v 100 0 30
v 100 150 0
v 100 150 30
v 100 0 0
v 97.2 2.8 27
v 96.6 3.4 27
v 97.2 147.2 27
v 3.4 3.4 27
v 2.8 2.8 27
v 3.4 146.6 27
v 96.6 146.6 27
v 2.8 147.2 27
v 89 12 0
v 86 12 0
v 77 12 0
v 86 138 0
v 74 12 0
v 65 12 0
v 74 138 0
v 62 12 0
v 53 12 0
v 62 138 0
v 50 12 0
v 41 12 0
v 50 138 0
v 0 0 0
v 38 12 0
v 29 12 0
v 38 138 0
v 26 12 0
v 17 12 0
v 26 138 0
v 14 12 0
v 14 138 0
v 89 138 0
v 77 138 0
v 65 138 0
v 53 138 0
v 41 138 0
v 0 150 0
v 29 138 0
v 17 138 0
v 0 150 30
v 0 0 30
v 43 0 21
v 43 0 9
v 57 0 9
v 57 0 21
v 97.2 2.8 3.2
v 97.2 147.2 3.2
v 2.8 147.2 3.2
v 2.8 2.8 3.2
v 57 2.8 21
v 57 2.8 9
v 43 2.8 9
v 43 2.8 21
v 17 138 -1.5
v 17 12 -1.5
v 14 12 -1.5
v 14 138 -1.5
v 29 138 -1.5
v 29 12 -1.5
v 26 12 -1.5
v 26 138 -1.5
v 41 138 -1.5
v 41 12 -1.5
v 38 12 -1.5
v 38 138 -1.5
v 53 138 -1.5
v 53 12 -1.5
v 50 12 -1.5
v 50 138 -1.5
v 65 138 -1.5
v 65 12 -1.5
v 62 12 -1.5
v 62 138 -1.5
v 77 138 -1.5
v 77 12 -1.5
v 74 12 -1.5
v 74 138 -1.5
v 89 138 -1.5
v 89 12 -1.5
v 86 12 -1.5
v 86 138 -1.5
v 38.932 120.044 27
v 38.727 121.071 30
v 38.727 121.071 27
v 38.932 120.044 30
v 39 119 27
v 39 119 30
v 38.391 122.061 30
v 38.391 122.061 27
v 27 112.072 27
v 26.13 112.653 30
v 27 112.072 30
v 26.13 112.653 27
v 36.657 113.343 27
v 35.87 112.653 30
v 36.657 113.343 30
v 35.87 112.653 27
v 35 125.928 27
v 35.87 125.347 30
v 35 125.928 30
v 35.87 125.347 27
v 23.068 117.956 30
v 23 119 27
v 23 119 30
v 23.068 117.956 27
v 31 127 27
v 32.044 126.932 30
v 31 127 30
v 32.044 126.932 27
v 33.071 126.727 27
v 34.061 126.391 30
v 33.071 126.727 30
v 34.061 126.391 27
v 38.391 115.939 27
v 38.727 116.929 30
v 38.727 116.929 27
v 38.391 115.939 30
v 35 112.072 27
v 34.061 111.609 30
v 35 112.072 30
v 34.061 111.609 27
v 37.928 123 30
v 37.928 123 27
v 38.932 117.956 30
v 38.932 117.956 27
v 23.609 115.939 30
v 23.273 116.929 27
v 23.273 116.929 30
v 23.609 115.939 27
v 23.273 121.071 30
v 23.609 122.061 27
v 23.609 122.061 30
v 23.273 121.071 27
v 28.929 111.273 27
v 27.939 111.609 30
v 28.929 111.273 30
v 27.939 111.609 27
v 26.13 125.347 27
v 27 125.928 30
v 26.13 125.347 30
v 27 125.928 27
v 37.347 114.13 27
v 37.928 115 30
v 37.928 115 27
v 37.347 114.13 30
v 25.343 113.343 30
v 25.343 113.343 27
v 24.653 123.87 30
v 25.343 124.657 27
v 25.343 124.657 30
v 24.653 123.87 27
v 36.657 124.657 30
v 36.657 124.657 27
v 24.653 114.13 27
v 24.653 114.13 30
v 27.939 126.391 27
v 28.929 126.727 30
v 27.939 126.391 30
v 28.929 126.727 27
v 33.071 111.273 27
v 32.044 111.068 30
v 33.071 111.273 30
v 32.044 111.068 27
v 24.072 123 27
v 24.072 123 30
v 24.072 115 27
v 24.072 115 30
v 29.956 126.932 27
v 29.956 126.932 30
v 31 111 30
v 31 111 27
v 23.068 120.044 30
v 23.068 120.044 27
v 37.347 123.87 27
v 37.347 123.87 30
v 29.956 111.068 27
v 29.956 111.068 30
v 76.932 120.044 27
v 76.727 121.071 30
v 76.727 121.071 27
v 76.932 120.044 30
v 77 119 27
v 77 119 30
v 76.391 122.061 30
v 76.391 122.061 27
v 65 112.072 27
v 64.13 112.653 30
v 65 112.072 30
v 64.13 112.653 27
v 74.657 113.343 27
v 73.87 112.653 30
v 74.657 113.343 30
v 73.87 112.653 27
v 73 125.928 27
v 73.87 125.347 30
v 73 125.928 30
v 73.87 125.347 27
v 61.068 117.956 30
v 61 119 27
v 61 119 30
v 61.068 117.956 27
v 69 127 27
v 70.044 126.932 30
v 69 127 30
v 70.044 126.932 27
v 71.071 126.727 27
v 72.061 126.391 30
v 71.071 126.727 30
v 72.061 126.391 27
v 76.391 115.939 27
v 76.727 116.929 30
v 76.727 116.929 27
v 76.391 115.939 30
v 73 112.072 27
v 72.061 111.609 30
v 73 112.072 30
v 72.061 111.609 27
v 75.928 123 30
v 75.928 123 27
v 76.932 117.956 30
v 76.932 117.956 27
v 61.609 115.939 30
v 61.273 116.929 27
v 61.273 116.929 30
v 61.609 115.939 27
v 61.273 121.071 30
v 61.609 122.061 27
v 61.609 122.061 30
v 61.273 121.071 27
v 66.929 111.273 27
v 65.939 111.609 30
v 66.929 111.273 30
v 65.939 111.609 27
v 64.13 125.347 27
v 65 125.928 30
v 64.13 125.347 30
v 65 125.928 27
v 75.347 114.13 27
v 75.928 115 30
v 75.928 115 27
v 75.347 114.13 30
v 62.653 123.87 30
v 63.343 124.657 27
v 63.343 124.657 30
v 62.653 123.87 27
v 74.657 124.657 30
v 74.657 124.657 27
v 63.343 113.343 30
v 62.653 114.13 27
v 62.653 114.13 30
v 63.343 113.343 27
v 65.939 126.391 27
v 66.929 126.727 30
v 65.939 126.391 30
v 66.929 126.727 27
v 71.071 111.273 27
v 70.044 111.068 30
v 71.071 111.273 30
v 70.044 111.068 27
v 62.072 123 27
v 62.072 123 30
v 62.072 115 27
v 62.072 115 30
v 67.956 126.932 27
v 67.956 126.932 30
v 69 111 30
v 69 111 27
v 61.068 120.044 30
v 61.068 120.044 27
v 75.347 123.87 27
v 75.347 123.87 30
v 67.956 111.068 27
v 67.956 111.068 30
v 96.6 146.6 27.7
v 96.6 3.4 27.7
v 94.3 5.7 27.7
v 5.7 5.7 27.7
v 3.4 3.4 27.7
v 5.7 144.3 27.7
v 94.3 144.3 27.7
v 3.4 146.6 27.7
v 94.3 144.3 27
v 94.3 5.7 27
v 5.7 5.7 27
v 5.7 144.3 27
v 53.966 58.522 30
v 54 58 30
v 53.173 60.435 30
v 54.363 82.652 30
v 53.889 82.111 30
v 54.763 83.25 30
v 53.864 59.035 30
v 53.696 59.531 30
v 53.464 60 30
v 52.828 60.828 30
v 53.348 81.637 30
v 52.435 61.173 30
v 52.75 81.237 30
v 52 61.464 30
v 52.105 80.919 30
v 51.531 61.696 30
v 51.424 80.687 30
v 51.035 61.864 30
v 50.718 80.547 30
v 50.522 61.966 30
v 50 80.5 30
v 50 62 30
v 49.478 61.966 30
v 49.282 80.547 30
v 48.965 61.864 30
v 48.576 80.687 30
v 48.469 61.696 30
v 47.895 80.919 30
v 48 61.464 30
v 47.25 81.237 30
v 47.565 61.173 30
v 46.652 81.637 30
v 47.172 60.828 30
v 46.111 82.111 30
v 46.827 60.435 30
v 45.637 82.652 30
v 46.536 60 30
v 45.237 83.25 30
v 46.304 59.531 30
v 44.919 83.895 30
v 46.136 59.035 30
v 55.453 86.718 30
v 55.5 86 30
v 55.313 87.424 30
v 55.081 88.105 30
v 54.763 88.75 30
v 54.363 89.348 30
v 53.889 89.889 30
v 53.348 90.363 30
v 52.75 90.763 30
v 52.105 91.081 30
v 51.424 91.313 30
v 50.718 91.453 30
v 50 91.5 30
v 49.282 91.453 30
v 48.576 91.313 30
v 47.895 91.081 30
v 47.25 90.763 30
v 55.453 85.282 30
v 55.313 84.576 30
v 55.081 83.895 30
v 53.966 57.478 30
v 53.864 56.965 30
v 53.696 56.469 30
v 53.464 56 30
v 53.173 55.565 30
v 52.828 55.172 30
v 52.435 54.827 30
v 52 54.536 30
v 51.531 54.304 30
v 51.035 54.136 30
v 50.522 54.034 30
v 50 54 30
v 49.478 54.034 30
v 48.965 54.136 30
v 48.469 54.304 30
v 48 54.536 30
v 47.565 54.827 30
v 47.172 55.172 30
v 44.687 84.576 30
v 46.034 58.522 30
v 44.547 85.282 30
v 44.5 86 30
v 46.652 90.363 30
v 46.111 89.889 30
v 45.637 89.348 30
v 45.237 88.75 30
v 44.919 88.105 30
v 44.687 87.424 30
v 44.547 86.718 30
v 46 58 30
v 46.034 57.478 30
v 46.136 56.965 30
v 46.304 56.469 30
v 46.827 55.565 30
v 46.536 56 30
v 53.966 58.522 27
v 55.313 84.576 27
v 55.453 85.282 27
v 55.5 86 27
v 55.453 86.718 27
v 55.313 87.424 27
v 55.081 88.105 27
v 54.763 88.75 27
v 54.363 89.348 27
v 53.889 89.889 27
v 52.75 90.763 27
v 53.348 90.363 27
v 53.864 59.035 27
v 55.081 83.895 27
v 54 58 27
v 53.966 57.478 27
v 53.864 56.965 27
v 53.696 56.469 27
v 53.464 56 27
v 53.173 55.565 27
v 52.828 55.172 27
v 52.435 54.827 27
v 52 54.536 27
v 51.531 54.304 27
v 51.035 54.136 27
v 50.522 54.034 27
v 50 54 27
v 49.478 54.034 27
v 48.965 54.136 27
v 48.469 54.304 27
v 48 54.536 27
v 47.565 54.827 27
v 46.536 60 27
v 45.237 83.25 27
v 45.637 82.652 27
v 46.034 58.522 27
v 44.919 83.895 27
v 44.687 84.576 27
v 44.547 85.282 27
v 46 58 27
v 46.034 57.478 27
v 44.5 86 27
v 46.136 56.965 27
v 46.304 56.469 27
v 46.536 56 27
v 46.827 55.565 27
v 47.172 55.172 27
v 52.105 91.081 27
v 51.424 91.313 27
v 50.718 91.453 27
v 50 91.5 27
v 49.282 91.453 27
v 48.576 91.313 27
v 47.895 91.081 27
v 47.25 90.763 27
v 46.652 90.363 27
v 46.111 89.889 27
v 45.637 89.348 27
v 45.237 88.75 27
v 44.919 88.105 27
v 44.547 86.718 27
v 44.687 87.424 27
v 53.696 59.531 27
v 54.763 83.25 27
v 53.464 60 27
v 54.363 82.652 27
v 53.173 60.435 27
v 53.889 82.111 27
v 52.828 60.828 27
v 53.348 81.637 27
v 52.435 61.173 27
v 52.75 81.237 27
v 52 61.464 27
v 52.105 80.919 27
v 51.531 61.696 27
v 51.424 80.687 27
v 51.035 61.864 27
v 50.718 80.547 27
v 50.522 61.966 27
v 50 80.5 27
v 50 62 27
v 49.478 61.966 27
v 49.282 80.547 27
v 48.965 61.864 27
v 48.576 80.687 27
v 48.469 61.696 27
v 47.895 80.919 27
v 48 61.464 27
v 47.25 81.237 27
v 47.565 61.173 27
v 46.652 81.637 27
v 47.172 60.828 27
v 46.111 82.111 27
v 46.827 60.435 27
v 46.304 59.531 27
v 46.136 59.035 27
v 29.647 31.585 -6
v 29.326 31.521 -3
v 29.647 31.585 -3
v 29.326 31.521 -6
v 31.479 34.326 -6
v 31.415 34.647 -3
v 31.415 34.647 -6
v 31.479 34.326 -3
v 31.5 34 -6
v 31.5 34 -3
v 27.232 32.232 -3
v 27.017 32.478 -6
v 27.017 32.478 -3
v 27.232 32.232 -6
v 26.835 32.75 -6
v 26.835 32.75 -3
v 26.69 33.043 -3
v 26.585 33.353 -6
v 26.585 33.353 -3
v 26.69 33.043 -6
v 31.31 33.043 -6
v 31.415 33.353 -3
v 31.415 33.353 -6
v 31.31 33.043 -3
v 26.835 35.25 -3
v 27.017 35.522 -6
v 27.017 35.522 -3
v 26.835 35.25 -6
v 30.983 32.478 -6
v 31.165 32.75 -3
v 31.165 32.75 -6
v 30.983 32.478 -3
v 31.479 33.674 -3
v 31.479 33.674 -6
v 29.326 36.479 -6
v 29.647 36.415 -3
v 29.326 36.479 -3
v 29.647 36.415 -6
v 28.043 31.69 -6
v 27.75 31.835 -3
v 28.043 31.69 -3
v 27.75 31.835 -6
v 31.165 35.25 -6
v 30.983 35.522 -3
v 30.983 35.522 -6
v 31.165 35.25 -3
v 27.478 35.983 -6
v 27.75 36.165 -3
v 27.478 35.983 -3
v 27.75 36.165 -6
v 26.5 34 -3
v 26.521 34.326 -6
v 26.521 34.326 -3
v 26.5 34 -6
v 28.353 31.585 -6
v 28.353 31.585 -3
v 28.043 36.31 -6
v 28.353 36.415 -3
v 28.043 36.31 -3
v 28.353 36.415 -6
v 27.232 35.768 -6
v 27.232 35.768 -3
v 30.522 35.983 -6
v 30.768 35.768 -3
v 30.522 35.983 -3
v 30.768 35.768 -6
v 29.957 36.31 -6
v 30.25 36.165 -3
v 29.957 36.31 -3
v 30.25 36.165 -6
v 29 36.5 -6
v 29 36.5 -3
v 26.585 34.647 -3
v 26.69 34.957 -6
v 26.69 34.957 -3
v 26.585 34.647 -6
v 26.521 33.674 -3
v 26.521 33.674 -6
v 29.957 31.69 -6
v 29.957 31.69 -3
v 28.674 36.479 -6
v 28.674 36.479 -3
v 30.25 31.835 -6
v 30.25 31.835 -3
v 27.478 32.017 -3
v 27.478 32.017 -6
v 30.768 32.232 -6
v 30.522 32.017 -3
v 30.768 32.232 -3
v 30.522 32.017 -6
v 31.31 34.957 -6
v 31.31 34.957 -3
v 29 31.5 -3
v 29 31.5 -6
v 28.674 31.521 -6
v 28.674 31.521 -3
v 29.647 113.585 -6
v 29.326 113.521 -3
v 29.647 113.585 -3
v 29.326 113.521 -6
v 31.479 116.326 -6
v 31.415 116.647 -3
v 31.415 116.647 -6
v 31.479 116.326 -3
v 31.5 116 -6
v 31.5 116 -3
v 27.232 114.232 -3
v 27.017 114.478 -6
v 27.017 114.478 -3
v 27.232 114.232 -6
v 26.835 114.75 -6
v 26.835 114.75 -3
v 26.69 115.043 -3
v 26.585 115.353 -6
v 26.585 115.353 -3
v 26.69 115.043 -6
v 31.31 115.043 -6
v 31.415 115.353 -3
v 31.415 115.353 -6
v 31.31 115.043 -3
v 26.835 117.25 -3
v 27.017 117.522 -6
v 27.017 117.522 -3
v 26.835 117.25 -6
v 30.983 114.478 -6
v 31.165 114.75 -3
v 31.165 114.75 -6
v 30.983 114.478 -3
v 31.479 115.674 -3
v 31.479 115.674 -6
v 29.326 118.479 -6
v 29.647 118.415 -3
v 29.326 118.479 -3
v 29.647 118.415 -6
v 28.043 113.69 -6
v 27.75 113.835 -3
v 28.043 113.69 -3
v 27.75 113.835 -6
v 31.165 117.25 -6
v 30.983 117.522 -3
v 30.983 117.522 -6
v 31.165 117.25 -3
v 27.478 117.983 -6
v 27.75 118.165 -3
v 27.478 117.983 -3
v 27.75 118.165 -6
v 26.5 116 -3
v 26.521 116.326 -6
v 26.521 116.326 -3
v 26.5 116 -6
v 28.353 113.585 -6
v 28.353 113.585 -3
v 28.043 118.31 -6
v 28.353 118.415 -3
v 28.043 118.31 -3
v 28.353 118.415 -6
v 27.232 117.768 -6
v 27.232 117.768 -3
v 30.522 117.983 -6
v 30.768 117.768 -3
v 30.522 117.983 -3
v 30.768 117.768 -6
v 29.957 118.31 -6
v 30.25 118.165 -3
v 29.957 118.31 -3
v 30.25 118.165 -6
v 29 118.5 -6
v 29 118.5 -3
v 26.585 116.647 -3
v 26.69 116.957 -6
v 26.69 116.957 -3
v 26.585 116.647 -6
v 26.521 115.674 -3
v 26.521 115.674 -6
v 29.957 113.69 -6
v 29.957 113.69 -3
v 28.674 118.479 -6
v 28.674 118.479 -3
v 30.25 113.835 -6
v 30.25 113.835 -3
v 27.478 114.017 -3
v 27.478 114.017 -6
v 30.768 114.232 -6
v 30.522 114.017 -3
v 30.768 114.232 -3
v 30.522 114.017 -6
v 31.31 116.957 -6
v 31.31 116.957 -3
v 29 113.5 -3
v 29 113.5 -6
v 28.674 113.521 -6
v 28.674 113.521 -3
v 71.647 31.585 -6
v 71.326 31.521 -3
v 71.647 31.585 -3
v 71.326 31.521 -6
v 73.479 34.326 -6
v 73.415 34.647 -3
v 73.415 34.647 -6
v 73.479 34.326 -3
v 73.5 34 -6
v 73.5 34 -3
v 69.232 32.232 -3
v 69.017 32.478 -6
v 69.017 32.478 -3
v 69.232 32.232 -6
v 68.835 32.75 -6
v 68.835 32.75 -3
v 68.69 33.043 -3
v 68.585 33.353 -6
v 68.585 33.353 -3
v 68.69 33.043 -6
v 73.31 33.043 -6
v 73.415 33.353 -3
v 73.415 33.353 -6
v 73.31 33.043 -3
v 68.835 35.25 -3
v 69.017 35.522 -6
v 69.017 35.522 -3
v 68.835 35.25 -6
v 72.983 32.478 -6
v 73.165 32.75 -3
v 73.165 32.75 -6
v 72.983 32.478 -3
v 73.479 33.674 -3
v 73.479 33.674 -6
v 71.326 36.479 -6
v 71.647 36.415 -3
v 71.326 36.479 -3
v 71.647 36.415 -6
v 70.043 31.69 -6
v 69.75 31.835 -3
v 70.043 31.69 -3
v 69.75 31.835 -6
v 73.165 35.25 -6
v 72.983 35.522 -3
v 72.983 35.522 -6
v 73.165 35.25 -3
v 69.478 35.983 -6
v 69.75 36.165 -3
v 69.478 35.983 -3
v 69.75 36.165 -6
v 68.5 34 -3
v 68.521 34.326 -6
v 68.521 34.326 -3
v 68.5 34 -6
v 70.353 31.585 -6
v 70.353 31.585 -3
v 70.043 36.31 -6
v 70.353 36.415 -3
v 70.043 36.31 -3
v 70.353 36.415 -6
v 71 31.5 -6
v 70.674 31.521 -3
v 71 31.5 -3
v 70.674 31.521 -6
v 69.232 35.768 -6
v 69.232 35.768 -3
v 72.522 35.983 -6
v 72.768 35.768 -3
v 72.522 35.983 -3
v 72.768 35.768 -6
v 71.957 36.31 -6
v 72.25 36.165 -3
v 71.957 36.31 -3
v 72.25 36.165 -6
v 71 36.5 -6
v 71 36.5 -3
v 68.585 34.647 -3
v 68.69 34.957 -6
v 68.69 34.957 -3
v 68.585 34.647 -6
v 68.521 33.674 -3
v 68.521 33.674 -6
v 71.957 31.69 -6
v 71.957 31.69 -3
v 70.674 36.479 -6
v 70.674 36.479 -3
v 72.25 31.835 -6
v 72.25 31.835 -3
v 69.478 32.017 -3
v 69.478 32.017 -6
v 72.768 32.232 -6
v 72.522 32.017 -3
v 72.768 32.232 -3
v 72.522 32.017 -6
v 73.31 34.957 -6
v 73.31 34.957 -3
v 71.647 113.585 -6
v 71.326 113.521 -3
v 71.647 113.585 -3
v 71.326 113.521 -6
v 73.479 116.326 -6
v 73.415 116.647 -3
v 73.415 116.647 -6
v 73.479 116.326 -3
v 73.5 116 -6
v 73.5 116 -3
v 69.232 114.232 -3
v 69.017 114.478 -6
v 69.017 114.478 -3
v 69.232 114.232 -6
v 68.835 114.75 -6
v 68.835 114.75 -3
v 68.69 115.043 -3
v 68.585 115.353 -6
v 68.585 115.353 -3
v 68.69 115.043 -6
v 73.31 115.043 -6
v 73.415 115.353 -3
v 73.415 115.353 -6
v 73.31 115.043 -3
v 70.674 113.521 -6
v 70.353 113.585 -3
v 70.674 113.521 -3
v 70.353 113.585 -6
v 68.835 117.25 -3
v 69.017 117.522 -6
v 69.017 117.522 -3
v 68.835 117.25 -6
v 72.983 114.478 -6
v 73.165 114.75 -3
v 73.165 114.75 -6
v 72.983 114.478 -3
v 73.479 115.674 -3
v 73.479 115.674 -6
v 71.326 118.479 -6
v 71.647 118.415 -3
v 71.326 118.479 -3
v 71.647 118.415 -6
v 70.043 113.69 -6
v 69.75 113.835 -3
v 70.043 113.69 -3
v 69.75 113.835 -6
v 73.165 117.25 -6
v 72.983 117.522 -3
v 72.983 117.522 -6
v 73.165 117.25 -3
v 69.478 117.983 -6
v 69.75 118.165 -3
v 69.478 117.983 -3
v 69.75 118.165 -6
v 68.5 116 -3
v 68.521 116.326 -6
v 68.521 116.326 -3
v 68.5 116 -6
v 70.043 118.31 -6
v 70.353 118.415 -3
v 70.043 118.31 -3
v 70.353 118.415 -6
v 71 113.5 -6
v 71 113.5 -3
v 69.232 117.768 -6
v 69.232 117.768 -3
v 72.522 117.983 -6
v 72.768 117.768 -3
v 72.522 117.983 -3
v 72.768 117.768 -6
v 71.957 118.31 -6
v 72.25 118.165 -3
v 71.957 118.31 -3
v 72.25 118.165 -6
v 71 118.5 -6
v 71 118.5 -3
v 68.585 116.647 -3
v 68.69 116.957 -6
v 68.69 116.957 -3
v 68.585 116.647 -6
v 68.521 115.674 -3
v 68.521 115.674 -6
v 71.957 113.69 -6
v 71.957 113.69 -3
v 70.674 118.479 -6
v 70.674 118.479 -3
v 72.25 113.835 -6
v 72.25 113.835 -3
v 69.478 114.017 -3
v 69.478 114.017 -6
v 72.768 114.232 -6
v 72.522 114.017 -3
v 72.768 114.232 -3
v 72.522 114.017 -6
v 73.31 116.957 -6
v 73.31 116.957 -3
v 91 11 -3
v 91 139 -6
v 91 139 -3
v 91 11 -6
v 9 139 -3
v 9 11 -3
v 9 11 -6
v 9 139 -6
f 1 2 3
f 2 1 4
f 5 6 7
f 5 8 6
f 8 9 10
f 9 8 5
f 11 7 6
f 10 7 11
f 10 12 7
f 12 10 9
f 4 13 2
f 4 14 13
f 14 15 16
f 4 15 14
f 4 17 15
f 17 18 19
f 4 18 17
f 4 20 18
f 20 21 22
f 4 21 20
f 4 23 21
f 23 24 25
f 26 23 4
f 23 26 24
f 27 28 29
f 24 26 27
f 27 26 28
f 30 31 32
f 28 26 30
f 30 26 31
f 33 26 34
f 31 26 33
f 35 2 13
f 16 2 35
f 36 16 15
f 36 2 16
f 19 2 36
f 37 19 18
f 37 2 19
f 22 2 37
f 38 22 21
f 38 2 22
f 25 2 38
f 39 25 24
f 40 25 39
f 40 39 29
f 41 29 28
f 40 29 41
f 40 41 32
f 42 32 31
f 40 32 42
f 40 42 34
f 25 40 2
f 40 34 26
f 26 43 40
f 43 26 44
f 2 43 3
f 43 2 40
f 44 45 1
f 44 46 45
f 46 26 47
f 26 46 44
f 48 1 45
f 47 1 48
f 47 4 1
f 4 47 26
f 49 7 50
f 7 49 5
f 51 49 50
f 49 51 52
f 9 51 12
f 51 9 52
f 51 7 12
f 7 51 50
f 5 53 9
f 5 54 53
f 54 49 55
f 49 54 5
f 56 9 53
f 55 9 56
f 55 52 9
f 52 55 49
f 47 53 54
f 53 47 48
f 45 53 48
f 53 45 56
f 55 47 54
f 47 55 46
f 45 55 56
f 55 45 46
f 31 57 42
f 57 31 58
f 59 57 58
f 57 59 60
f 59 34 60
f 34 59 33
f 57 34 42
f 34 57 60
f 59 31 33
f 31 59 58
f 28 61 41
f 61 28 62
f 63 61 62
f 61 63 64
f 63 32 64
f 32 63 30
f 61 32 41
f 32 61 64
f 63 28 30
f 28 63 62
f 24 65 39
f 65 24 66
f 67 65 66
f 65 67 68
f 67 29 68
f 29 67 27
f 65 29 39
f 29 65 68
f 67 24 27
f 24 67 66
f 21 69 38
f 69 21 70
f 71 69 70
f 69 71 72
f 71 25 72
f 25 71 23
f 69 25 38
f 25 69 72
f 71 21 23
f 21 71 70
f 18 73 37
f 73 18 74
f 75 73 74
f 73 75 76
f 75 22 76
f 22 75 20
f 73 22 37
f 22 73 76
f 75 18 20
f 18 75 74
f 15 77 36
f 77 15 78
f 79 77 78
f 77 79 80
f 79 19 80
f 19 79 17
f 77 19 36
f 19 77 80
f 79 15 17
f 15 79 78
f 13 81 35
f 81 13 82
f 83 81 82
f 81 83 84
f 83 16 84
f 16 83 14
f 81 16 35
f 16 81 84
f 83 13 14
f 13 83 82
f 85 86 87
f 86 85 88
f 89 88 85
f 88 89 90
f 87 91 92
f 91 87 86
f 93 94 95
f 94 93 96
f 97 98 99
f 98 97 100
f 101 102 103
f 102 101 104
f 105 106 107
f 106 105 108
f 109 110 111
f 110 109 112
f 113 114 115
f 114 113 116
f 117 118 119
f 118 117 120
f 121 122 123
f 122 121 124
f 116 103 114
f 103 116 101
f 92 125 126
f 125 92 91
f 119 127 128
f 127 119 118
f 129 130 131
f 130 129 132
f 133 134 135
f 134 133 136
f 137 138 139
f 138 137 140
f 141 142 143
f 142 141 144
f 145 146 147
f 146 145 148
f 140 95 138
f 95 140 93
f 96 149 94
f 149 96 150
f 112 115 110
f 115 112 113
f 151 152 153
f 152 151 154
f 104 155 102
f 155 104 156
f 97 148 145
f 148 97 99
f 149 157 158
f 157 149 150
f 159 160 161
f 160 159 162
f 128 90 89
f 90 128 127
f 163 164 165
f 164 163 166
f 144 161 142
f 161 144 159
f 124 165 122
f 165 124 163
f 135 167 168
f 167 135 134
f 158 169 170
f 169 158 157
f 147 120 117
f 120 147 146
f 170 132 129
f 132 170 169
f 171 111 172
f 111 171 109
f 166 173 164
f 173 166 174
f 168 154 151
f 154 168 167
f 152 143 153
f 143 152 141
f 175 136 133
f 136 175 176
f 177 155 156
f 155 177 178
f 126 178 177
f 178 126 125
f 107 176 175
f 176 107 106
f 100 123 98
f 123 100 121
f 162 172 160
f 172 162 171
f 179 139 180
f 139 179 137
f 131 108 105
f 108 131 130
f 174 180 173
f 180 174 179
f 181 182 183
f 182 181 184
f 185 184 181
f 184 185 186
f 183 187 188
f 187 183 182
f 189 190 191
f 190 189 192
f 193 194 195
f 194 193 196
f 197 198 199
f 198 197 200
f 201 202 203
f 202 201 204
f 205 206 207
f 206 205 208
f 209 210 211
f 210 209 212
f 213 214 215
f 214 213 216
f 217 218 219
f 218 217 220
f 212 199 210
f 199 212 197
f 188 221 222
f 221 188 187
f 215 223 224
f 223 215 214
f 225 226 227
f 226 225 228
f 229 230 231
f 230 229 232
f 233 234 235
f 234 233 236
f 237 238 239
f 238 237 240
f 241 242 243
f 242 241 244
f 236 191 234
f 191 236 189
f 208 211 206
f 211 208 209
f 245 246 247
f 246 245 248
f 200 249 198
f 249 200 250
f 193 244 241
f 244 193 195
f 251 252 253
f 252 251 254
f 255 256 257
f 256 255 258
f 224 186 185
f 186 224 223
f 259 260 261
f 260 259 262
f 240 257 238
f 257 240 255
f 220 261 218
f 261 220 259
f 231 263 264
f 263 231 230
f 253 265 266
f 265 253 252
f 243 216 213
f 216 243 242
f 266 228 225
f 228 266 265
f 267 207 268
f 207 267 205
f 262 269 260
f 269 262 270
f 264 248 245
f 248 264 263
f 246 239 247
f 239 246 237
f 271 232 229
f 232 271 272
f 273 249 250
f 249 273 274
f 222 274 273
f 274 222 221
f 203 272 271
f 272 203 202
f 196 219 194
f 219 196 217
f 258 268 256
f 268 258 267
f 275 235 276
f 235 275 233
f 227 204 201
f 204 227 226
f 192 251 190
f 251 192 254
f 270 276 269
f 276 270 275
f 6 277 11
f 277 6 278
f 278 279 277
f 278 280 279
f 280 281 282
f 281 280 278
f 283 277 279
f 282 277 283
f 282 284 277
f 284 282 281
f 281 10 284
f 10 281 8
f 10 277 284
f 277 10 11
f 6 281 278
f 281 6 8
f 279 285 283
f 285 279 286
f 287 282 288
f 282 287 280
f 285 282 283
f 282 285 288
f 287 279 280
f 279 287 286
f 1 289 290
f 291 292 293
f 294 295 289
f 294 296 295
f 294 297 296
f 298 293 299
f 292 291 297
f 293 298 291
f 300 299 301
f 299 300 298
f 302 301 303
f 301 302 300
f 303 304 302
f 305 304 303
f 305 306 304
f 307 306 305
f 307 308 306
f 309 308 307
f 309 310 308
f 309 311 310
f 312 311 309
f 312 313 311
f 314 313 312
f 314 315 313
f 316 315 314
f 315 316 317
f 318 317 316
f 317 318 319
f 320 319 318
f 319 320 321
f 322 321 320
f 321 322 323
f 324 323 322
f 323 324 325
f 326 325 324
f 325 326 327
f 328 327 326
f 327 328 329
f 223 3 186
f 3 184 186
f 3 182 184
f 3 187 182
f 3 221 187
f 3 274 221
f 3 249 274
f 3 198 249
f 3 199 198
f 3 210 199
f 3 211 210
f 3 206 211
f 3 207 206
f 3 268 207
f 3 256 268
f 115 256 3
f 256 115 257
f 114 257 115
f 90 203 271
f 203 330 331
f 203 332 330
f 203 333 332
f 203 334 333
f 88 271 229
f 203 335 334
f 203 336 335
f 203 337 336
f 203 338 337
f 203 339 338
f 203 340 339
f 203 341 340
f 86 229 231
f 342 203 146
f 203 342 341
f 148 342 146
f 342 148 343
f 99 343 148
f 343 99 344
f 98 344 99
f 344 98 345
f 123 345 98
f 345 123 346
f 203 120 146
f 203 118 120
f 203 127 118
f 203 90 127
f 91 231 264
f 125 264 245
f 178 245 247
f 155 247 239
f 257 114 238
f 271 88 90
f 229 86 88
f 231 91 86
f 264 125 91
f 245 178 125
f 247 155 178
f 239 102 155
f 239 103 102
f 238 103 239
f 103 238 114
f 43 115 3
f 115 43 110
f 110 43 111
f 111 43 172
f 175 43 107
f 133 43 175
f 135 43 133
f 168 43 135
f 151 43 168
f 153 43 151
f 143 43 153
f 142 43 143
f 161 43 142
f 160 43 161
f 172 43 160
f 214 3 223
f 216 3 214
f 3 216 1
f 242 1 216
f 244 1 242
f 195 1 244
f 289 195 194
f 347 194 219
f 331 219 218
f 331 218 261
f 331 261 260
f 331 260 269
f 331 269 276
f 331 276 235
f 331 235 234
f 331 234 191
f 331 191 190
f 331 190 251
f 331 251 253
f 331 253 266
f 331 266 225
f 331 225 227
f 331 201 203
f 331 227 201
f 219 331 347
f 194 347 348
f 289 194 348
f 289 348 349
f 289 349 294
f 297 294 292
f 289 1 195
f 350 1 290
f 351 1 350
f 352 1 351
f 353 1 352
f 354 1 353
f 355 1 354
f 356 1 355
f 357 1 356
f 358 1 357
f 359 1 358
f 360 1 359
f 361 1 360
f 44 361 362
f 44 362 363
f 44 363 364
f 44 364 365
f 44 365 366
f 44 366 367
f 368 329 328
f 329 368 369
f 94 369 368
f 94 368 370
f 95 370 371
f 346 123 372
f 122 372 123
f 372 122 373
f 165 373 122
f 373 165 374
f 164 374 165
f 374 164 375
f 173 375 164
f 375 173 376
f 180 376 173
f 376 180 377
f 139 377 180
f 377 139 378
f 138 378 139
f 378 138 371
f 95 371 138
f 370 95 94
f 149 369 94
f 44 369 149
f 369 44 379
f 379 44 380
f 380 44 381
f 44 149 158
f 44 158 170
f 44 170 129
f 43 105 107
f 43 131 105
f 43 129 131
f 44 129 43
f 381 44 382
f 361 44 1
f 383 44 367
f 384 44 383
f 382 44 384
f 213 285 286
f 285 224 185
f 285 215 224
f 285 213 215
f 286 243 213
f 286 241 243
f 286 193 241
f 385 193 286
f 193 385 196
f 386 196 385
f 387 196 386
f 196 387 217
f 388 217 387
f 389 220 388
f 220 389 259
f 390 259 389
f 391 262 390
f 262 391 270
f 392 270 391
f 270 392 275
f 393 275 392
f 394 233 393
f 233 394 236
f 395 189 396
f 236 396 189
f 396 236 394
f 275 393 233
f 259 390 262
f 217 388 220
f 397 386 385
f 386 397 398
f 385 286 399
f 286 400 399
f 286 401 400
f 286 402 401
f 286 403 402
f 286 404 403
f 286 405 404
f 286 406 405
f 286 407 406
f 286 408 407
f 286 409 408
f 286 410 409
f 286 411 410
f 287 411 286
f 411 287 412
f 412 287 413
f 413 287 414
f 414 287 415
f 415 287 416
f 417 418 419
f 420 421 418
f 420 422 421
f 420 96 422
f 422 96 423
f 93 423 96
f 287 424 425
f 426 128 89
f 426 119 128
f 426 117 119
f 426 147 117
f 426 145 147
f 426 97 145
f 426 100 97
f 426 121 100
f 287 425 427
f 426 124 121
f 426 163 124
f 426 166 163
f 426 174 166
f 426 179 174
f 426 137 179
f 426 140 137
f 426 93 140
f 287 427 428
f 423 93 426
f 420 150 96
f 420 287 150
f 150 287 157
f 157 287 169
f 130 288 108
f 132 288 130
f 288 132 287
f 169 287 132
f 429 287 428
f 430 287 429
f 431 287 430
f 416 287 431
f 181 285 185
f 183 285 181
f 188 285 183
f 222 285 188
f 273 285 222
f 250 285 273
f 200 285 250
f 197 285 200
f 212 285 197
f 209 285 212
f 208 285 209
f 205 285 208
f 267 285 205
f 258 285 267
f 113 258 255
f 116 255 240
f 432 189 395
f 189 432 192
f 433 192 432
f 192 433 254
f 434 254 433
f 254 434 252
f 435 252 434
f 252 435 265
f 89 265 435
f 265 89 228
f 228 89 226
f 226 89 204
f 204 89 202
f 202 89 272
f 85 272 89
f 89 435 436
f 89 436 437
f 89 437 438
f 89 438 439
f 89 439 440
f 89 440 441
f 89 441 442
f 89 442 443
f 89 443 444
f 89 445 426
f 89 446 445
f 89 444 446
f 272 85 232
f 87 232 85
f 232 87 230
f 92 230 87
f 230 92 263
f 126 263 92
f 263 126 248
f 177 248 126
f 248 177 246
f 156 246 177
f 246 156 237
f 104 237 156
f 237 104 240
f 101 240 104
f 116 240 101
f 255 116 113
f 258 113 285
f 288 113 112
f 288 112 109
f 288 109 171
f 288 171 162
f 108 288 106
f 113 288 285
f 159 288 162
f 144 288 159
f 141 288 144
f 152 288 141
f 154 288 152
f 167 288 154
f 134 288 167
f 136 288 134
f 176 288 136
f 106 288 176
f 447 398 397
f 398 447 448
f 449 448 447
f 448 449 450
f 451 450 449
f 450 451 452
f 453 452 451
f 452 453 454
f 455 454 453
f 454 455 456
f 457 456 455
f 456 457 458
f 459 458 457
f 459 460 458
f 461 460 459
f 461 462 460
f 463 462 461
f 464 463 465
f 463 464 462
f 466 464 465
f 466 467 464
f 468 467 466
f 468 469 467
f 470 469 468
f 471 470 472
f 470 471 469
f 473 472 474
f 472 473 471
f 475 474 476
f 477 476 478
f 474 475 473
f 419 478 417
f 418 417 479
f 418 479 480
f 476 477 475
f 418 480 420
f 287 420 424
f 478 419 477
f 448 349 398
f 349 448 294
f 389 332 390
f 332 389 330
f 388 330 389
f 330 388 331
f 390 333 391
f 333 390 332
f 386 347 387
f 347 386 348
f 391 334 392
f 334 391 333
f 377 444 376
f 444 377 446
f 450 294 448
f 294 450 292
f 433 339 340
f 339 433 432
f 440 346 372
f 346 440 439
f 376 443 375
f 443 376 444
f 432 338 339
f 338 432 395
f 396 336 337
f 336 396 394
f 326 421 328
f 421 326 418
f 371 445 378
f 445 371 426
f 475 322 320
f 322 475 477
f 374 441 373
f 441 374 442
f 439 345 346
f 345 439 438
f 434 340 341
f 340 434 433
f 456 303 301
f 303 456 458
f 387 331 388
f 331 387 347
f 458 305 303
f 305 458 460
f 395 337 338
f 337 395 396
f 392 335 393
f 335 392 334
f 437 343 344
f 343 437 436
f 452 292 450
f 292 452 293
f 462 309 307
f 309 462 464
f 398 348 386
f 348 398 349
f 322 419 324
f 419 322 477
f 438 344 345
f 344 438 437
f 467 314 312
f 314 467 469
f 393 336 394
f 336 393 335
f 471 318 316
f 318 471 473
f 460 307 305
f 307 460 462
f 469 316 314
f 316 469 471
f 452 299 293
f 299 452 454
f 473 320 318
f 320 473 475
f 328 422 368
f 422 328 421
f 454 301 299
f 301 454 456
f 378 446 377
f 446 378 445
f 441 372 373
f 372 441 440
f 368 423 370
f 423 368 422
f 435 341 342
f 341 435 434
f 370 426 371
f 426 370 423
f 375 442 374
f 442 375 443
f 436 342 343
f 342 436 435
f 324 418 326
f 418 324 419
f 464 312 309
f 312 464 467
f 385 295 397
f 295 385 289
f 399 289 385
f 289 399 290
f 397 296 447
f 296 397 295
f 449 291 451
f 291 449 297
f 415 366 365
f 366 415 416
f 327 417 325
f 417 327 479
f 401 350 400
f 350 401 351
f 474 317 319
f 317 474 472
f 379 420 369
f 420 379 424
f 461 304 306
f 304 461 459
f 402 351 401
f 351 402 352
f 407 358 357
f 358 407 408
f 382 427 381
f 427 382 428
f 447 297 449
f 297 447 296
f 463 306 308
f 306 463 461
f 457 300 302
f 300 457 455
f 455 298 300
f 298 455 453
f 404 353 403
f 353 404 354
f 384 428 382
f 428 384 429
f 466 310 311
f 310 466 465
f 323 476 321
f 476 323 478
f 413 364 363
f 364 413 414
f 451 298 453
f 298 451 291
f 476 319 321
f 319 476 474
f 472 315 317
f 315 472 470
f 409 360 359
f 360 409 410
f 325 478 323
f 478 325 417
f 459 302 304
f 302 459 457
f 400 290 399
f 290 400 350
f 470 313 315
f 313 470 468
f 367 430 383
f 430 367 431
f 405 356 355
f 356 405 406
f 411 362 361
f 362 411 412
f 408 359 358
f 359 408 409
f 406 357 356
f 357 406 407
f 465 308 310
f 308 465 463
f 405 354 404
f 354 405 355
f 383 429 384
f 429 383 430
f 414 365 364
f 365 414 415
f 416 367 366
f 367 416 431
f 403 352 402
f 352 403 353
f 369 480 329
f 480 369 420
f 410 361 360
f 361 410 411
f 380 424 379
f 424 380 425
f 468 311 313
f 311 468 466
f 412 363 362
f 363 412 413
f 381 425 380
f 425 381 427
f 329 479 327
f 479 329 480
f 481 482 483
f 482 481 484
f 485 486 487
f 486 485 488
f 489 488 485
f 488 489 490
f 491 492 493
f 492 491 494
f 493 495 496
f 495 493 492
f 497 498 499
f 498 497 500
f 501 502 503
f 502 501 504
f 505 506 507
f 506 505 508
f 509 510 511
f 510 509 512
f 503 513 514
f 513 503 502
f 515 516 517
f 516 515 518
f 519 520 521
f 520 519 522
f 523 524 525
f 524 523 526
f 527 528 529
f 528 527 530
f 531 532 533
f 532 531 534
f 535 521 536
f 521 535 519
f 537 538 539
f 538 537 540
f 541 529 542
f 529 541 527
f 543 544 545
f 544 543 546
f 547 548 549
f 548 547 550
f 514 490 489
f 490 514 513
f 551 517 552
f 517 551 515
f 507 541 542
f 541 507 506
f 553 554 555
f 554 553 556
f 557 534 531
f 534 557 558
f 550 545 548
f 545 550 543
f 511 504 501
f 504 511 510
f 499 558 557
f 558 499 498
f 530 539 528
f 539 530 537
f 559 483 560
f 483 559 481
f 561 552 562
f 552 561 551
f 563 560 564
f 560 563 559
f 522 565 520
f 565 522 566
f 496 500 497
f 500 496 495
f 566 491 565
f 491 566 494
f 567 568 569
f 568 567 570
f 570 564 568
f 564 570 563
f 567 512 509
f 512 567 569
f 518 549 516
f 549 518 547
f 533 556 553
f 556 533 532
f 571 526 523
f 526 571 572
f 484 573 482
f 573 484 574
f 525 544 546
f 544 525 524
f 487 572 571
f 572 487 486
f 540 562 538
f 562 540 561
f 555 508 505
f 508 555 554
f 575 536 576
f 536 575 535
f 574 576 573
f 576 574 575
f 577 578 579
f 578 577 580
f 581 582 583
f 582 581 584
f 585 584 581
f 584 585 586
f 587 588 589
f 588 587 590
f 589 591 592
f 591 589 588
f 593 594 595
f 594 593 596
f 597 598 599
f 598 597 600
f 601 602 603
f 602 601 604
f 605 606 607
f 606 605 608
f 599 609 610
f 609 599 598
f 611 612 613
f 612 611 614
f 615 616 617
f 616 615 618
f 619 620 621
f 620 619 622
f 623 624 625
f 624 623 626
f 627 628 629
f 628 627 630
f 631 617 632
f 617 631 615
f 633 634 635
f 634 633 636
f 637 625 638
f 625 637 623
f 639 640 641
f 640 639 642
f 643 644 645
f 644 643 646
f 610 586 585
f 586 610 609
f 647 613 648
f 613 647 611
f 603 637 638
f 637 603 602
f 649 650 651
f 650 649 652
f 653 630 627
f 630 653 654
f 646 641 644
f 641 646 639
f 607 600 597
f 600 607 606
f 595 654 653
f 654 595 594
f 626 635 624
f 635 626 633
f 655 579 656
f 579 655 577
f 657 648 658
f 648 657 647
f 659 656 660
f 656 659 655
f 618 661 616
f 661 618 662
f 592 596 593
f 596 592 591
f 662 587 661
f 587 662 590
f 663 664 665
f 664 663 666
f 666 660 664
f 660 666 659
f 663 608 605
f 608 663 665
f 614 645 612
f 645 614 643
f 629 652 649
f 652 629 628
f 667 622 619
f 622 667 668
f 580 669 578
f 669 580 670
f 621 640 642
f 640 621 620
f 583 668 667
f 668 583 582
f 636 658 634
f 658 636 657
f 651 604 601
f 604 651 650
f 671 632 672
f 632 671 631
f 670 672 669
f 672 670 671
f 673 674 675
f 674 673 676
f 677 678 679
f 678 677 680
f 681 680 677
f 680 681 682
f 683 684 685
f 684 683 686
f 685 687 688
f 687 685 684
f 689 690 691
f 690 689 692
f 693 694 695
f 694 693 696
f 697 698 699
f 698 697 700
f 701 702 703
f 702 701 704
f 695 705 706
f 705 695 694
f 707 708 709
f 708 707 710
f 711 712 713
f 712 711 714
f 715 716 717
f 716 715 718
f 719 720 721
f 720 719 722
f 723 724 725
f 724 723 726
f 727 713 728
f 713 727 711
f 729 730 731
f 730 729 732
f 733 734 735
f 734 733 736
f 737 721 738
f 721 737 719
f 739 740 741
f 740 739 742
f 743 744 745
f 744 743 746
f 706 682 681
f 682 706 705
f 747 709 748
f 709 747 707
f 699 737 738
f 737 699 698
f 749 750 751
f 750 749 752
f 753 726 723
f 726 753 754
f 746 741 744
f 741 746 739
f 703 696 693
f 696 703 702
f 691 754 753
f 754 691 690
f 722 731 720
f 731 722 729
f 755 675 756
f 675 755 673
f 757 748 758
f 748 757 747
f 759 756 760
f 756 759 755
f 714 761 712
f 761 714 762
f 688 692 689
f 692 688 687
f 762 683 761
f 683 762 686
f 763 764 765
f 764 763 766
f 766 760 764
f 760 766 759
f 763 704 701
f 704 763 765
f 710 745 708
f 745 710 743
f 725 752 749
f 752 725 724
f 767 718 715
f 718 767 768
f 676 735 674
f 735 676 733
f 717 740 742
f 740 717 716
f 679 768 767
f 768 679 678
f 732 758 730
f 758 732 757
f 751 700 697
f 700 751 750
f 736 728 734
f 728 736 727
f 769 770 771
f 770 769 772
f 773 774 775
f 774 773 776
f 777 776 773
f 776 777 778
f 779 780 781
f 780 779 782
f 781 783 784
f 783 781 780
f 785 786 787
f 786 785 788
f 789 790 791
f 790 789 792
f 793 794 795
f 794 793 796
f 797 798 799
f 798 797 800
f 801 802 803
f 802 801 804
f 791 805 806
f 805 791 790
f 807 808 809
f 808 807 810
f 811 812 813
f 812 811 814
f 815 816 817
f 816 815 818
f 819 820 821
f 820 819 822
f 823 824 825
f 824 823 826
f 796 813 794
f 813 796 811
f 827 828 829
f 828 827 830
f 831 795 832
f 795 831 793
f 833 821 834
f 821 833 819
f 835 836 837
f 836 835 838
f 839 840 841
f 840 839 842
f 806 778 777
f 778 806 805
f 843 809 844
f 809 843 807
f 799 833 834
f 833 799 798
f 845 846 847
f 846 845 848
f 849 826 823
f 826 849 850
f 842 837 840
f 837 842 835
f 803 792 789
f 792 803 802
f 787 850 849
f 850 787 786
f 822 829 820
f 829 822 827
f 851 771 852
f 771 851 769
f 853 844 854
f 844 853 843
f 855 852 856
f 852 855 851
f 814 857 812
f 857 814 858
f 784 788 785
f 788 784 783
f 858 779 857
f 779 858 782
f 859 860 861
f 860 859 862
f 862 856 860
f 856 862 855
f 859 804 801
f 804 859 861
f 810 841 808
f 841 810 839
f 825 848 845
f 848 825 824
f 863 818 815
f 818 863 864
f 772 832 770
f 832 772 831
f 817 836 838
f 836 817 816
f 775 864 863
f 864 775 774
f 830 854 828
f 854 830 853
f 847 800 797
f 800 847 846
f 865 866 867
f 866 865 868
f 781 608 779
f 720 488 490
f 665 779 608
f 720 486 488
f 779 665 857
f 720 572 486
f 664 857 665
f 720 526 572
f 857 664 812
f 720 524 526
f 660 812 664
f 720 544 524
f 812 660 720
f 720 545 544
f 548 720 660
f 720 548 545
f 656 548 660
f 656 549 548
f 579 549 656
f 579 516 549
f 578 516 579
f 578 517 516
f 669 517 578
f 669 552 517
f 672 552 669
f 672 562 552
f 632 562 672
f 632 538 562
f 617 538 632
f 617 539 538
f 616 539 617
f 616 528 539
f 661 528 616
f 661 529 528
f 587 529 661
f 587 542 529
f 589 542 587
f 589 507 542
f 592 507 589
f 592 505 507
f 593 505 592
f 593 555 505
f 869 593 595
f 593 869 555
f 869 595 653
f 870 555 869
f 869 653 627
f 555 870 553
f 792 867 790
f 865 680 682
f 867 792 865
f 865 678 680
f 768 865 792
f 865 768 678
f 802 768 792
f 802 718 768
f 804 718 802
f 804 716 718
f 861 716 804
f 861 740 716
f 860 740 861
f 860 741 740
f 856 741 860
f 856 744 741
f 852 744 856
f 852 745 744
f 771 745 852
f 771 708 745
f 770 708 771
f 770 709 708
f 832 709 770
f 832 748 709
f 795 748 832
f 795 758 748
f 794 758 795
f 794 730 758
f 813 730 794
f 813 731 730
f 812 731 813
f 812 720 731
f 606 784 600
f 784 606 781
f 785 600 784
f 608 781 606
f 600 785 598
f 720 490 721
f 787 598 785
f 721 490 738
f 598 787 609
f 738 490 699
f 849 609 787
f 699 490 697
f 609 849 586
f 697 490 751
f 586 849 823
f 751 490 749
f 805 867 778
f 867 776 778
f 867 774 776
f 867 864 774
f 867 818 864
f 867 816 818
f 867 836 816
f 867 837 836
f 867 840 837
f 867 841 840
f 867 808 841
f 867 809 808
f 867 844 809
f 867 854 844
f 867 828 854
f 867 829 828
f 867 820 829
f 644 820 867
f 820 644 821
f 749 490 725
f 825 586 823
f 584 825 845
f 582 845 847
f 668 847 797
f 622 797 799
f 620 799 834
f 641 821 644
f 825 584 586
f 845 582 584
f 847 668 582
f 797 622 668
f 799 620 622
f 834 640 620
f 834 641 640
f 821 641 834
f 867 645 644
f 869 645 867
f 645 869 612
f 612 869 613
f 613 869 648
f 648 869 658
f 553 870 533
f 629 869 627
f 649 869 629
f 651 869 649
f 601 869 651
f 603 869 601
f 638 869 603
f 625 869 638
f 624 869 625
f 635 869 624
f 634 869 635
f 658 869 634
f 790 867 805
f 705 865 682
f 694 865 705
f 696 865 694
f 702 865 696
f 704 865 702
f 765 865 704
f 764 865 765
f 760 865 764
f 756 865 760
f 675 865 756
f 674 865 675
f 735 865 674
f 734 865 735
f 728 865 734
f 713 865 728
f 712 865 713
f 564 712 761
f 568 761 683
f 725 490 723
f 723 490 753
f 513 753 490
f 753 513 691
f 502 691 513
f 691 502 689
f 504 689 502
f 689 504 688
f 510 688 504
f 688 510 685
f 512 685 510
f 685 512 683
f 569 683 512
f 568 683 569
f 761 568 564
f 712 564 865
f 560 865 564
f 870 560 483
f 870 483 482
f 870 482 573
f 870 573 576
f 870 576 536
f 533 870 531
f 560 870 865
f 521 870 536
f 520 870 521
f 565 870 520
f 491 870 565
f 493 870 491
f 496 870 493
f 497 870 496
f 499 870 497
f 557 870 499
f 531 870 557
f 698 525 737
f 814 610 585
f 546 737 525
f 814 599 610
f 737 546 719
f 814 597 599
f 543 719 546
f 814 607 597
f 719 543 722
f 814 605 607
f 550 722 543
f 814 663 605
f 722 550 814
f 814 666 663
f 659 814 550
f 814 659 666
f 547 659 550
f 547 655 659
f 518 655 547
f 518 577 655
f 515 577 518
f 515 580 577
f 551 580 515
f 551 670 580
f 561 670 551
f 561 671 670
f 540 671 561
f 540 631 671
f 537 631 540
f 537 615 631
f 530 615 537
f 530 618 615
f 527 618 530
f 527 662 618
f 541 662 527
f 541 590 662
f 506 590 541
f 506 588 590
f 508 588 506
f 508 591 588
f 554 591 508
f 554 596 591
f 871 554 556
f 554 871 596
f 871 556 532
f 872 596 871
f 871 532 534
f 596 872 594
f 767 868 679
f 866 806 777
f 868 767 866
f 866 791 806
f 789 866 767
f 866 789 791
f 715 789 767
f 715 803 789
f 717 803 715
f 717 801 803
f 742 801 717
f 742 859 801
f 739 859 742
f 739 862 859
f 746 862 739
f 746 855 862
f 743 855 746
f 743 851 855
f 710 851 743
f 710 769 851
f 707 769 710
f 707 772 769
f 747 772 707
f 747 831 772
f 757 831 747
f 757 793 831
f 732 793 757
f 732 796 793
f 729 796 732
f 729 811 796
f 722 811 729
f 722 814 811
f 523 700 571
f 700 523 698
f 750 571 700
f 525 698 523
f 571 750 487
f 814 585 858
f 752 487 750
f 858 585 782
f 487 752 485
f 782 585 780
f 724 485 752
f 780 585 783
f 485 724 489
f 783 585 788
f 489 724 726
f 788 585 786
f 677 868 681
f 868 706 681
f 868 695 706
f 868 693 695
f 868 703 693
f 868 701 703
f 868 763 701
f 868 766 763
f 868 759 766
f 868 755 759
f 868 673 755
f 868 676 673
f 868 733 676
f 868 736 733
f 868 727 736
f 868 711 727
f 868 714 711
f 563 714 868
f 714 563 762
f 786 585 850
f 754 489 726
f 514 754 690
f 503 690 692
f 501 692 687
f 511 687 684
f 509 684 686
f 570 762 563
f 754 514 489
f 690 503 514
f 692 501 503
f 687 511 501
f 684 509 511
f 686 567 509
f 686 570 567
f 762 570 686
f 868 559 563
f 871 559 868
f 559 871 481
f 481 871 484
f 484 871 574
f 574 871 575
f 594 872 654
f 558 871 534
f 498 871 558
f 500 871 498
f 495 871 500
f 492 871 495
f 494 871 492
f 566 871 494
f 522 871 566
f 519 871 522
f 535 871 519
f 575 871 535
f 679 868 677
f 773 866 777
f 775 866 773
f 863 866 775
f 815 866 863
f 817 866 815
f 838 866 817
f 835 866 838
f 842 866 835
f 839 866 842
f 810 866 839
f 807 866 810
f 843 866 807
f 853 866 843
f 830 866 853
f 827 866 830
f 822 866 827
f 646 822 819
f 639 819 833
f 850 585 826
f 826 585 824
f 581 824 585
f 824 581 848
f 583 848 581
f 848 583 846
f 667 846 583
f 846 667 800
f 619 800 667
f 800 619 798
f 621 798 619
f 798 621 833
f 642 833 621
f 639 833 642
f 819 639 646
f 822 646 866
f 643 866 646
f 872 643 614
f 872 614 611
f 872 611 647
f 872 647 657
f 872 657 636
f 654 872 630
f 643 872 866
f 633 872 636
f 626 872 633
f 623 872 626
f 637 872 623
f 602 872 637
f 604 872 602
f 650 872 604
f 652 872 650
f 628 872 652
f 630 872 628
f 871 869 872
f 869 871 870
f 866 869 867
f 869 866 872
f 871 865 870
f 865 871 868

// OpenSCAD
// Fixed wall appliance - P0 dimensional study, NOT verified enclosure/fit/IP.
$fn = 48;
part = "assembly"; // "body", "lid", "bracket", "dock", "assembly", "exploded"
W=100; H=150; D=30; // aspirational head only, mm
wall=2.8; rear=3.2; lid_t=3.0; gap=0.6; seal_w=2.3;
lens_d=16; nir_emitter_d=11; pir_d=8;

module body() {
    difference() {
      cube([W,H,D-lid_t]);
      translate([wall,wall,rear])
          cube([W-2*wall,H-2*wall,D-rear-lid_t+0.2]);
      translate([W/2-7,-0.2,9]) cube([14,wall+0.6,12]); // unsealed cable aperture TBD
    }
    // External ridges (NO through-slots); thermal conductivity unverified
    for (x=[14:12:86]) translate([x,12,-1.5]) cube([3,H-24,1.5]);
}
module lid() {
   difference() {
      cube([W,H,lid_t]);
      for(x=[31,69]) translate([x,H-31,-0.2]) cylinder(d=lens_d,h=lid_t+0.5);
      translate([W/2,H-64,-0.2]) cylinder(d=nir_emitter_d,h=lid_t+0.5);
      translate([W/2,H-92,-0.2]) cylinder(d=pir_d,h=lid_t+0.5);
      // illustrative square gasket groove. Compression/method unknown.
      difference() {
         translate([wall+gap,wall+gap,-0.2])
             cube([W-2*(wall+gap),H-2*(wall+gap),0.9]);
         translate([wall+gap+seal_w,wall+gap+seal_w,-0.3])
             cube([W-2*(wall+gap+seal_w),H-2*(wall+gap+seal_w),1.1]);
      }
   }
}
module bracket() {
   difference() {
      cube([W-18,H-22,3]);
      for(x=[20,W-38],y=[23,H-45])
         translate([x,y,-0.2]) cylinder(d=5,h=3.5);
   }
}
module dock() { // Optional protected commercial battery/PoE dock: OUTSIDE head target
   difference(){
      cube([84,90,32]);
      translate([3,3,4]) cube([78,84,29]);
   }
}
if (part=="body") body();
else if (part=="lid") lid();
else if (part=="bracket") bracket();
else if (part=="dock") dock();
else if(part=="exploded") {
    color("DimGray") body();
    color("Black") translate([0,0,D+20]) lid();
    color("Silver") translate([9,11,-15]) bracket();
    color("LightGray") translate([W+20,0,0]) dock();
} else {
    color("DimGray") body();
    color("Black") translate([0,0,D-lid_t]) lid();
    color("Silver") translate([9,11,-6]) bracket();
}
